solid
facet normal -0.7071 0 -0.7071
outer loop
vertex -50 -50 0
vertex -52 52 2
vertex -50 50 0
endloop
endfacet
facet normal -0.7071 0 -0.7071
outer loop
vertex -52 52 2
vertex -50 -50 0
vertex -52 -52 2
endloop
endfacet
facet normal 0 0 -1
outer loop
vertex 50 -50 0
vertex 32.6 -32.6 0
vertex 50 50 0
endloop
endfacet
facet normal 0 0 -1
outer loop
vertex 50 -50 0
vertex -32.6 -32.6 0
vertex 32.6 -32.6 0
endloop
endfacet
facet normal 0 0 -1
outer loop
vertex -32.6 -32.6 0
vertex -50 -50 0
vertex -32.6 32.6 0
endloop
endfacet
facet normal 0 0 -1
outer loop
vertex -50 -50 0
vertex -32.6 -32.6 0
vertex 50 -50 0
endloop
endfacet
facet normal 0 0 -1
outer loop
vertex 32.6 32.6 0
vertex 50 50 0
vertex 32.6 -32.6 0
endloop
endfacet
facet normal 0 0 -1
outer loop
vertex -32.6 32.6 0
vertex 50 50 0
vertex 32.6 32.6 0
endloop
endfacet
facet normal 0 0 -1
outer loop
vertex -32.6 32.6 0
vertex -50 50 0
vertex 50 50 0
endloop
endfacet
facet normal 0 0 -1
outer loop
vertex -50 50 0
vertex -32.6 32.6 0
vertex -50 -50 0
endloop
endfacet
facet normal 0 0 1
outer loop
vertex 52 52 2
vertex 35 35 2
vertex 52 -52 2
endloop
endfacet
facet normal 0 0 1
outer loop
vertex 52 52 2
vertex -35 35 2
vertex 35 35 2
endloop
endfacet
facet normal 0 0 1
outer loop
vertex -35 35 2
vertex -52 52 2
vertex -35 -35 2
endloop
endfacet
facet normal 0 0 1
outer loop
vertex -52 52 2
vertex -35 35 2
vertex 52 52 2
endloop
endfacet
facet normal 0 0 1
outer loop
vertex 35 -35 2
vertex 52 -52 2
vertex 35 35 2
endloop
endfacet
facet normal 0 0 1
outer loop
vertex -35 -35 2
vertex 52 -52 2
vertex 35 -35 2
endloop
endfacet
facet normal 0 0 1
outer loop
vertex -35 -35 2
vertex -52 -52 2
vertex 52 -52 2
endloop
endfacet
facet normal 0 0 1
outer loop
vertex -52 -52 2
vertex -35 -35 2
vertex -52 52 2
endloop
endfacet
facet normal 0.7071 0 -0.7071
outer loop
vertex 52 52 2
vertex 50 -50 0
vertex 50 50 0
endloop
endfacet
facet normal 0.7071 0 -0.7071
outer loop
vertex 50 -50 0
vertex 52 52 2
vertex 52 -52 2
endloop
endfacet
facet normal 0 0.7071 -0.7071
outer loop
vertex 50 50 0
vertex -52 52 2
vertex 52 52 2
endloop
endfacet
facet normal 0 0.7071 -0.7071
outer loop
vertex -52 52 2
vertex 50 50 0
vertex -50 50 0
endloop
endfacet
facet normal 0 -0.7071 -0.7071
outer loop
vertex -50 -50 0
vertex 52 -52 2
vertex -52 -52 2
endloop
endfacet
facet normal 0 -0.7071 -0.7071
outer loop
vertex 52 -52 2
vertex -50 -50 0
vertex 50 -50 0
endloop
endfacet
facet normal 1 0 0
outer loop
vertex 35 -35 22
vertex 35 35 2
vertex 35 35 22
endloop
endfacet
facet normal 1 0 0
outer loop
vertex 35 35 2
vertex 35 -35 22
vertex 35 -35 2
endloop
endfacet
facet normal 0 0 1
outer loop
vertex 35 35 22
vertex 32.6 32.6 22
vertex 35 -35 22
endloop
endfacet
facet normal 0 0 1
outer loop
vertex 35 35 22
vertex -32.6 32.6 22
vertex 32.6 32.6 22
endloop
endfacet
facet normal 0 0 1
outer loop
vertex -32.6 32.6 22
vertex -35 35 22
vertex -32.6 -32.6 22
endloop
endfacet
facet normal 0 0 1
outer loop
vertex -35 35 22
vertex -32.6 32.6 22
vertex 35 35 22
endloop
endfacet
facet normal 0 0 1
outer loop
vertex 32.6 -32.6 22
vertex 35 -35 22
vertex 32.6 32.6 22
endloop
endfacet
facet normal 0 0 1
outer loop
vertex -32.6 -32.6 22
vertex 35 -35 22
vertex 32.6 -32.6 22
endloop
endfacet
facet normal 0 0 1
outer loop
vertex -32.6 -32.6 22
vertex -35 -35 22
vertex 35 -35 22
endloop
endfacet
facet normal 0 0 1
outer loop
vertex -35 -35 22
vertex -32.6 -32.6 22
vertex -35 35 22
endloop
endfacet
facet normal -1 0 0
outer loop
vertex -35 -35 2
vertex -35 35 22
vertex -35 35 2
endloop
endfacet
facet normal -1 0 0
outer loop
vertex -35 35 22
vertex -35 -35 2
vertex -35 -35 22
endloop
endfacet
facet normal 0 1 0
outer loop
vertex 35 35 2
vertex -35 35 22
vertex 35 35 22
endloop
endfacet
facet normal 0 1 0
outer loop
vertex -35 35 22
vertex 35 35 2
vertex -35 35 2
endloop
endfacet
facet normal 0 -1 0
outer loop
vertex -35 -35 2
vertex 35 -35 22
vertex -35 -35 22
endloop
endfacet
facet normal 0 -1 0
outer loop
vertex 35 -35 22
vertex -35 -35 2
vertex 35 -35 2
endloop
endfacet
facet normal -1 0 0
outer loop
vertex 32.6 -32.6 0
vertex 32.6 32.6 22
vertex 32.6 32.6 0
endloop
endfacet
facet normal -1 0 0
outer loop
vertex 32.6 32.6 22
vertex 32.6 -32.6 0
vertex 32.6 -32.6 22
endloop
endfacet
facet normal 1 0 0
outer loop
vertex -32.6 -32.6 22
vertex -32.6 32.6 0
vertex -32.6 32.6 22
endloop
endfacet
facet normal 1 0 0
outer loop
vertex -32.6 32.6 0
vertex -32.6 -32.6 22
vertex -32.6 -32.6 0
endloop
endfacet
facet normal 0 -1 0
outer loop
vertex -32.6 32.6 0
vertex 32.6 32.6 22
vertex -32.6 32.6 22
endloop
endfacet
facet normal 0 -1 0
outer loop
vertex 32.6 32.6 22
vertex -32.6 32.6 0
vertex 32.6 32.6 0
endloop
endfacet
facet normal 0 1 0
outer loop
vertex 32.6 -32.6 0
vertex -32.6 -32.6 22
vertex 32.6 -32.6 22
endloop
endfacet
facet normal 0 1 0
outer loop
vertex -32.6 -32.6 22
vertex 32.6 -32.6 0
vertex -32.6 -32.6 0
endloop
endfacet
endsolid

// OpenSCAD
// file: Valve_Vars.scad
innerHeight=20;
outerWidth=70;
latchWidth=15;

baseThickness=2;
wallThickness=2.4;
backgroundLatchThickness=4;

pipeDiameter=28;

wallSpace=0.4;

totalWidth=outerWidth+2*latchWidth;
innerWidth=outerWidth-2*wallThickness;
totalHeight=innerHeight+baseThickness;
scaleFactor=(totalWidth+2*baseThickness)/totalWidth;

backgroundLatchWidth=innerWidth-2*wallSpace;

module centerCube(w,h,z)
{
  w2=w/2;
  translate([-w2,-w2,z])
  cube([w,w,h]);
}
// main file
include <Valve_Vars.scad>

difference()
{
	union()
	{
		linear_extrude(height=baseThickness,scale=scaleFactor)
		translate([-totalWidth/2,-totalWidth/2])
		square([totalWidth,totalWidth]);

		centerCube(outerWidth,totalHeight,0);
	}
	
	centerCube(innerWidth,totalHeight+2,-1);
}
